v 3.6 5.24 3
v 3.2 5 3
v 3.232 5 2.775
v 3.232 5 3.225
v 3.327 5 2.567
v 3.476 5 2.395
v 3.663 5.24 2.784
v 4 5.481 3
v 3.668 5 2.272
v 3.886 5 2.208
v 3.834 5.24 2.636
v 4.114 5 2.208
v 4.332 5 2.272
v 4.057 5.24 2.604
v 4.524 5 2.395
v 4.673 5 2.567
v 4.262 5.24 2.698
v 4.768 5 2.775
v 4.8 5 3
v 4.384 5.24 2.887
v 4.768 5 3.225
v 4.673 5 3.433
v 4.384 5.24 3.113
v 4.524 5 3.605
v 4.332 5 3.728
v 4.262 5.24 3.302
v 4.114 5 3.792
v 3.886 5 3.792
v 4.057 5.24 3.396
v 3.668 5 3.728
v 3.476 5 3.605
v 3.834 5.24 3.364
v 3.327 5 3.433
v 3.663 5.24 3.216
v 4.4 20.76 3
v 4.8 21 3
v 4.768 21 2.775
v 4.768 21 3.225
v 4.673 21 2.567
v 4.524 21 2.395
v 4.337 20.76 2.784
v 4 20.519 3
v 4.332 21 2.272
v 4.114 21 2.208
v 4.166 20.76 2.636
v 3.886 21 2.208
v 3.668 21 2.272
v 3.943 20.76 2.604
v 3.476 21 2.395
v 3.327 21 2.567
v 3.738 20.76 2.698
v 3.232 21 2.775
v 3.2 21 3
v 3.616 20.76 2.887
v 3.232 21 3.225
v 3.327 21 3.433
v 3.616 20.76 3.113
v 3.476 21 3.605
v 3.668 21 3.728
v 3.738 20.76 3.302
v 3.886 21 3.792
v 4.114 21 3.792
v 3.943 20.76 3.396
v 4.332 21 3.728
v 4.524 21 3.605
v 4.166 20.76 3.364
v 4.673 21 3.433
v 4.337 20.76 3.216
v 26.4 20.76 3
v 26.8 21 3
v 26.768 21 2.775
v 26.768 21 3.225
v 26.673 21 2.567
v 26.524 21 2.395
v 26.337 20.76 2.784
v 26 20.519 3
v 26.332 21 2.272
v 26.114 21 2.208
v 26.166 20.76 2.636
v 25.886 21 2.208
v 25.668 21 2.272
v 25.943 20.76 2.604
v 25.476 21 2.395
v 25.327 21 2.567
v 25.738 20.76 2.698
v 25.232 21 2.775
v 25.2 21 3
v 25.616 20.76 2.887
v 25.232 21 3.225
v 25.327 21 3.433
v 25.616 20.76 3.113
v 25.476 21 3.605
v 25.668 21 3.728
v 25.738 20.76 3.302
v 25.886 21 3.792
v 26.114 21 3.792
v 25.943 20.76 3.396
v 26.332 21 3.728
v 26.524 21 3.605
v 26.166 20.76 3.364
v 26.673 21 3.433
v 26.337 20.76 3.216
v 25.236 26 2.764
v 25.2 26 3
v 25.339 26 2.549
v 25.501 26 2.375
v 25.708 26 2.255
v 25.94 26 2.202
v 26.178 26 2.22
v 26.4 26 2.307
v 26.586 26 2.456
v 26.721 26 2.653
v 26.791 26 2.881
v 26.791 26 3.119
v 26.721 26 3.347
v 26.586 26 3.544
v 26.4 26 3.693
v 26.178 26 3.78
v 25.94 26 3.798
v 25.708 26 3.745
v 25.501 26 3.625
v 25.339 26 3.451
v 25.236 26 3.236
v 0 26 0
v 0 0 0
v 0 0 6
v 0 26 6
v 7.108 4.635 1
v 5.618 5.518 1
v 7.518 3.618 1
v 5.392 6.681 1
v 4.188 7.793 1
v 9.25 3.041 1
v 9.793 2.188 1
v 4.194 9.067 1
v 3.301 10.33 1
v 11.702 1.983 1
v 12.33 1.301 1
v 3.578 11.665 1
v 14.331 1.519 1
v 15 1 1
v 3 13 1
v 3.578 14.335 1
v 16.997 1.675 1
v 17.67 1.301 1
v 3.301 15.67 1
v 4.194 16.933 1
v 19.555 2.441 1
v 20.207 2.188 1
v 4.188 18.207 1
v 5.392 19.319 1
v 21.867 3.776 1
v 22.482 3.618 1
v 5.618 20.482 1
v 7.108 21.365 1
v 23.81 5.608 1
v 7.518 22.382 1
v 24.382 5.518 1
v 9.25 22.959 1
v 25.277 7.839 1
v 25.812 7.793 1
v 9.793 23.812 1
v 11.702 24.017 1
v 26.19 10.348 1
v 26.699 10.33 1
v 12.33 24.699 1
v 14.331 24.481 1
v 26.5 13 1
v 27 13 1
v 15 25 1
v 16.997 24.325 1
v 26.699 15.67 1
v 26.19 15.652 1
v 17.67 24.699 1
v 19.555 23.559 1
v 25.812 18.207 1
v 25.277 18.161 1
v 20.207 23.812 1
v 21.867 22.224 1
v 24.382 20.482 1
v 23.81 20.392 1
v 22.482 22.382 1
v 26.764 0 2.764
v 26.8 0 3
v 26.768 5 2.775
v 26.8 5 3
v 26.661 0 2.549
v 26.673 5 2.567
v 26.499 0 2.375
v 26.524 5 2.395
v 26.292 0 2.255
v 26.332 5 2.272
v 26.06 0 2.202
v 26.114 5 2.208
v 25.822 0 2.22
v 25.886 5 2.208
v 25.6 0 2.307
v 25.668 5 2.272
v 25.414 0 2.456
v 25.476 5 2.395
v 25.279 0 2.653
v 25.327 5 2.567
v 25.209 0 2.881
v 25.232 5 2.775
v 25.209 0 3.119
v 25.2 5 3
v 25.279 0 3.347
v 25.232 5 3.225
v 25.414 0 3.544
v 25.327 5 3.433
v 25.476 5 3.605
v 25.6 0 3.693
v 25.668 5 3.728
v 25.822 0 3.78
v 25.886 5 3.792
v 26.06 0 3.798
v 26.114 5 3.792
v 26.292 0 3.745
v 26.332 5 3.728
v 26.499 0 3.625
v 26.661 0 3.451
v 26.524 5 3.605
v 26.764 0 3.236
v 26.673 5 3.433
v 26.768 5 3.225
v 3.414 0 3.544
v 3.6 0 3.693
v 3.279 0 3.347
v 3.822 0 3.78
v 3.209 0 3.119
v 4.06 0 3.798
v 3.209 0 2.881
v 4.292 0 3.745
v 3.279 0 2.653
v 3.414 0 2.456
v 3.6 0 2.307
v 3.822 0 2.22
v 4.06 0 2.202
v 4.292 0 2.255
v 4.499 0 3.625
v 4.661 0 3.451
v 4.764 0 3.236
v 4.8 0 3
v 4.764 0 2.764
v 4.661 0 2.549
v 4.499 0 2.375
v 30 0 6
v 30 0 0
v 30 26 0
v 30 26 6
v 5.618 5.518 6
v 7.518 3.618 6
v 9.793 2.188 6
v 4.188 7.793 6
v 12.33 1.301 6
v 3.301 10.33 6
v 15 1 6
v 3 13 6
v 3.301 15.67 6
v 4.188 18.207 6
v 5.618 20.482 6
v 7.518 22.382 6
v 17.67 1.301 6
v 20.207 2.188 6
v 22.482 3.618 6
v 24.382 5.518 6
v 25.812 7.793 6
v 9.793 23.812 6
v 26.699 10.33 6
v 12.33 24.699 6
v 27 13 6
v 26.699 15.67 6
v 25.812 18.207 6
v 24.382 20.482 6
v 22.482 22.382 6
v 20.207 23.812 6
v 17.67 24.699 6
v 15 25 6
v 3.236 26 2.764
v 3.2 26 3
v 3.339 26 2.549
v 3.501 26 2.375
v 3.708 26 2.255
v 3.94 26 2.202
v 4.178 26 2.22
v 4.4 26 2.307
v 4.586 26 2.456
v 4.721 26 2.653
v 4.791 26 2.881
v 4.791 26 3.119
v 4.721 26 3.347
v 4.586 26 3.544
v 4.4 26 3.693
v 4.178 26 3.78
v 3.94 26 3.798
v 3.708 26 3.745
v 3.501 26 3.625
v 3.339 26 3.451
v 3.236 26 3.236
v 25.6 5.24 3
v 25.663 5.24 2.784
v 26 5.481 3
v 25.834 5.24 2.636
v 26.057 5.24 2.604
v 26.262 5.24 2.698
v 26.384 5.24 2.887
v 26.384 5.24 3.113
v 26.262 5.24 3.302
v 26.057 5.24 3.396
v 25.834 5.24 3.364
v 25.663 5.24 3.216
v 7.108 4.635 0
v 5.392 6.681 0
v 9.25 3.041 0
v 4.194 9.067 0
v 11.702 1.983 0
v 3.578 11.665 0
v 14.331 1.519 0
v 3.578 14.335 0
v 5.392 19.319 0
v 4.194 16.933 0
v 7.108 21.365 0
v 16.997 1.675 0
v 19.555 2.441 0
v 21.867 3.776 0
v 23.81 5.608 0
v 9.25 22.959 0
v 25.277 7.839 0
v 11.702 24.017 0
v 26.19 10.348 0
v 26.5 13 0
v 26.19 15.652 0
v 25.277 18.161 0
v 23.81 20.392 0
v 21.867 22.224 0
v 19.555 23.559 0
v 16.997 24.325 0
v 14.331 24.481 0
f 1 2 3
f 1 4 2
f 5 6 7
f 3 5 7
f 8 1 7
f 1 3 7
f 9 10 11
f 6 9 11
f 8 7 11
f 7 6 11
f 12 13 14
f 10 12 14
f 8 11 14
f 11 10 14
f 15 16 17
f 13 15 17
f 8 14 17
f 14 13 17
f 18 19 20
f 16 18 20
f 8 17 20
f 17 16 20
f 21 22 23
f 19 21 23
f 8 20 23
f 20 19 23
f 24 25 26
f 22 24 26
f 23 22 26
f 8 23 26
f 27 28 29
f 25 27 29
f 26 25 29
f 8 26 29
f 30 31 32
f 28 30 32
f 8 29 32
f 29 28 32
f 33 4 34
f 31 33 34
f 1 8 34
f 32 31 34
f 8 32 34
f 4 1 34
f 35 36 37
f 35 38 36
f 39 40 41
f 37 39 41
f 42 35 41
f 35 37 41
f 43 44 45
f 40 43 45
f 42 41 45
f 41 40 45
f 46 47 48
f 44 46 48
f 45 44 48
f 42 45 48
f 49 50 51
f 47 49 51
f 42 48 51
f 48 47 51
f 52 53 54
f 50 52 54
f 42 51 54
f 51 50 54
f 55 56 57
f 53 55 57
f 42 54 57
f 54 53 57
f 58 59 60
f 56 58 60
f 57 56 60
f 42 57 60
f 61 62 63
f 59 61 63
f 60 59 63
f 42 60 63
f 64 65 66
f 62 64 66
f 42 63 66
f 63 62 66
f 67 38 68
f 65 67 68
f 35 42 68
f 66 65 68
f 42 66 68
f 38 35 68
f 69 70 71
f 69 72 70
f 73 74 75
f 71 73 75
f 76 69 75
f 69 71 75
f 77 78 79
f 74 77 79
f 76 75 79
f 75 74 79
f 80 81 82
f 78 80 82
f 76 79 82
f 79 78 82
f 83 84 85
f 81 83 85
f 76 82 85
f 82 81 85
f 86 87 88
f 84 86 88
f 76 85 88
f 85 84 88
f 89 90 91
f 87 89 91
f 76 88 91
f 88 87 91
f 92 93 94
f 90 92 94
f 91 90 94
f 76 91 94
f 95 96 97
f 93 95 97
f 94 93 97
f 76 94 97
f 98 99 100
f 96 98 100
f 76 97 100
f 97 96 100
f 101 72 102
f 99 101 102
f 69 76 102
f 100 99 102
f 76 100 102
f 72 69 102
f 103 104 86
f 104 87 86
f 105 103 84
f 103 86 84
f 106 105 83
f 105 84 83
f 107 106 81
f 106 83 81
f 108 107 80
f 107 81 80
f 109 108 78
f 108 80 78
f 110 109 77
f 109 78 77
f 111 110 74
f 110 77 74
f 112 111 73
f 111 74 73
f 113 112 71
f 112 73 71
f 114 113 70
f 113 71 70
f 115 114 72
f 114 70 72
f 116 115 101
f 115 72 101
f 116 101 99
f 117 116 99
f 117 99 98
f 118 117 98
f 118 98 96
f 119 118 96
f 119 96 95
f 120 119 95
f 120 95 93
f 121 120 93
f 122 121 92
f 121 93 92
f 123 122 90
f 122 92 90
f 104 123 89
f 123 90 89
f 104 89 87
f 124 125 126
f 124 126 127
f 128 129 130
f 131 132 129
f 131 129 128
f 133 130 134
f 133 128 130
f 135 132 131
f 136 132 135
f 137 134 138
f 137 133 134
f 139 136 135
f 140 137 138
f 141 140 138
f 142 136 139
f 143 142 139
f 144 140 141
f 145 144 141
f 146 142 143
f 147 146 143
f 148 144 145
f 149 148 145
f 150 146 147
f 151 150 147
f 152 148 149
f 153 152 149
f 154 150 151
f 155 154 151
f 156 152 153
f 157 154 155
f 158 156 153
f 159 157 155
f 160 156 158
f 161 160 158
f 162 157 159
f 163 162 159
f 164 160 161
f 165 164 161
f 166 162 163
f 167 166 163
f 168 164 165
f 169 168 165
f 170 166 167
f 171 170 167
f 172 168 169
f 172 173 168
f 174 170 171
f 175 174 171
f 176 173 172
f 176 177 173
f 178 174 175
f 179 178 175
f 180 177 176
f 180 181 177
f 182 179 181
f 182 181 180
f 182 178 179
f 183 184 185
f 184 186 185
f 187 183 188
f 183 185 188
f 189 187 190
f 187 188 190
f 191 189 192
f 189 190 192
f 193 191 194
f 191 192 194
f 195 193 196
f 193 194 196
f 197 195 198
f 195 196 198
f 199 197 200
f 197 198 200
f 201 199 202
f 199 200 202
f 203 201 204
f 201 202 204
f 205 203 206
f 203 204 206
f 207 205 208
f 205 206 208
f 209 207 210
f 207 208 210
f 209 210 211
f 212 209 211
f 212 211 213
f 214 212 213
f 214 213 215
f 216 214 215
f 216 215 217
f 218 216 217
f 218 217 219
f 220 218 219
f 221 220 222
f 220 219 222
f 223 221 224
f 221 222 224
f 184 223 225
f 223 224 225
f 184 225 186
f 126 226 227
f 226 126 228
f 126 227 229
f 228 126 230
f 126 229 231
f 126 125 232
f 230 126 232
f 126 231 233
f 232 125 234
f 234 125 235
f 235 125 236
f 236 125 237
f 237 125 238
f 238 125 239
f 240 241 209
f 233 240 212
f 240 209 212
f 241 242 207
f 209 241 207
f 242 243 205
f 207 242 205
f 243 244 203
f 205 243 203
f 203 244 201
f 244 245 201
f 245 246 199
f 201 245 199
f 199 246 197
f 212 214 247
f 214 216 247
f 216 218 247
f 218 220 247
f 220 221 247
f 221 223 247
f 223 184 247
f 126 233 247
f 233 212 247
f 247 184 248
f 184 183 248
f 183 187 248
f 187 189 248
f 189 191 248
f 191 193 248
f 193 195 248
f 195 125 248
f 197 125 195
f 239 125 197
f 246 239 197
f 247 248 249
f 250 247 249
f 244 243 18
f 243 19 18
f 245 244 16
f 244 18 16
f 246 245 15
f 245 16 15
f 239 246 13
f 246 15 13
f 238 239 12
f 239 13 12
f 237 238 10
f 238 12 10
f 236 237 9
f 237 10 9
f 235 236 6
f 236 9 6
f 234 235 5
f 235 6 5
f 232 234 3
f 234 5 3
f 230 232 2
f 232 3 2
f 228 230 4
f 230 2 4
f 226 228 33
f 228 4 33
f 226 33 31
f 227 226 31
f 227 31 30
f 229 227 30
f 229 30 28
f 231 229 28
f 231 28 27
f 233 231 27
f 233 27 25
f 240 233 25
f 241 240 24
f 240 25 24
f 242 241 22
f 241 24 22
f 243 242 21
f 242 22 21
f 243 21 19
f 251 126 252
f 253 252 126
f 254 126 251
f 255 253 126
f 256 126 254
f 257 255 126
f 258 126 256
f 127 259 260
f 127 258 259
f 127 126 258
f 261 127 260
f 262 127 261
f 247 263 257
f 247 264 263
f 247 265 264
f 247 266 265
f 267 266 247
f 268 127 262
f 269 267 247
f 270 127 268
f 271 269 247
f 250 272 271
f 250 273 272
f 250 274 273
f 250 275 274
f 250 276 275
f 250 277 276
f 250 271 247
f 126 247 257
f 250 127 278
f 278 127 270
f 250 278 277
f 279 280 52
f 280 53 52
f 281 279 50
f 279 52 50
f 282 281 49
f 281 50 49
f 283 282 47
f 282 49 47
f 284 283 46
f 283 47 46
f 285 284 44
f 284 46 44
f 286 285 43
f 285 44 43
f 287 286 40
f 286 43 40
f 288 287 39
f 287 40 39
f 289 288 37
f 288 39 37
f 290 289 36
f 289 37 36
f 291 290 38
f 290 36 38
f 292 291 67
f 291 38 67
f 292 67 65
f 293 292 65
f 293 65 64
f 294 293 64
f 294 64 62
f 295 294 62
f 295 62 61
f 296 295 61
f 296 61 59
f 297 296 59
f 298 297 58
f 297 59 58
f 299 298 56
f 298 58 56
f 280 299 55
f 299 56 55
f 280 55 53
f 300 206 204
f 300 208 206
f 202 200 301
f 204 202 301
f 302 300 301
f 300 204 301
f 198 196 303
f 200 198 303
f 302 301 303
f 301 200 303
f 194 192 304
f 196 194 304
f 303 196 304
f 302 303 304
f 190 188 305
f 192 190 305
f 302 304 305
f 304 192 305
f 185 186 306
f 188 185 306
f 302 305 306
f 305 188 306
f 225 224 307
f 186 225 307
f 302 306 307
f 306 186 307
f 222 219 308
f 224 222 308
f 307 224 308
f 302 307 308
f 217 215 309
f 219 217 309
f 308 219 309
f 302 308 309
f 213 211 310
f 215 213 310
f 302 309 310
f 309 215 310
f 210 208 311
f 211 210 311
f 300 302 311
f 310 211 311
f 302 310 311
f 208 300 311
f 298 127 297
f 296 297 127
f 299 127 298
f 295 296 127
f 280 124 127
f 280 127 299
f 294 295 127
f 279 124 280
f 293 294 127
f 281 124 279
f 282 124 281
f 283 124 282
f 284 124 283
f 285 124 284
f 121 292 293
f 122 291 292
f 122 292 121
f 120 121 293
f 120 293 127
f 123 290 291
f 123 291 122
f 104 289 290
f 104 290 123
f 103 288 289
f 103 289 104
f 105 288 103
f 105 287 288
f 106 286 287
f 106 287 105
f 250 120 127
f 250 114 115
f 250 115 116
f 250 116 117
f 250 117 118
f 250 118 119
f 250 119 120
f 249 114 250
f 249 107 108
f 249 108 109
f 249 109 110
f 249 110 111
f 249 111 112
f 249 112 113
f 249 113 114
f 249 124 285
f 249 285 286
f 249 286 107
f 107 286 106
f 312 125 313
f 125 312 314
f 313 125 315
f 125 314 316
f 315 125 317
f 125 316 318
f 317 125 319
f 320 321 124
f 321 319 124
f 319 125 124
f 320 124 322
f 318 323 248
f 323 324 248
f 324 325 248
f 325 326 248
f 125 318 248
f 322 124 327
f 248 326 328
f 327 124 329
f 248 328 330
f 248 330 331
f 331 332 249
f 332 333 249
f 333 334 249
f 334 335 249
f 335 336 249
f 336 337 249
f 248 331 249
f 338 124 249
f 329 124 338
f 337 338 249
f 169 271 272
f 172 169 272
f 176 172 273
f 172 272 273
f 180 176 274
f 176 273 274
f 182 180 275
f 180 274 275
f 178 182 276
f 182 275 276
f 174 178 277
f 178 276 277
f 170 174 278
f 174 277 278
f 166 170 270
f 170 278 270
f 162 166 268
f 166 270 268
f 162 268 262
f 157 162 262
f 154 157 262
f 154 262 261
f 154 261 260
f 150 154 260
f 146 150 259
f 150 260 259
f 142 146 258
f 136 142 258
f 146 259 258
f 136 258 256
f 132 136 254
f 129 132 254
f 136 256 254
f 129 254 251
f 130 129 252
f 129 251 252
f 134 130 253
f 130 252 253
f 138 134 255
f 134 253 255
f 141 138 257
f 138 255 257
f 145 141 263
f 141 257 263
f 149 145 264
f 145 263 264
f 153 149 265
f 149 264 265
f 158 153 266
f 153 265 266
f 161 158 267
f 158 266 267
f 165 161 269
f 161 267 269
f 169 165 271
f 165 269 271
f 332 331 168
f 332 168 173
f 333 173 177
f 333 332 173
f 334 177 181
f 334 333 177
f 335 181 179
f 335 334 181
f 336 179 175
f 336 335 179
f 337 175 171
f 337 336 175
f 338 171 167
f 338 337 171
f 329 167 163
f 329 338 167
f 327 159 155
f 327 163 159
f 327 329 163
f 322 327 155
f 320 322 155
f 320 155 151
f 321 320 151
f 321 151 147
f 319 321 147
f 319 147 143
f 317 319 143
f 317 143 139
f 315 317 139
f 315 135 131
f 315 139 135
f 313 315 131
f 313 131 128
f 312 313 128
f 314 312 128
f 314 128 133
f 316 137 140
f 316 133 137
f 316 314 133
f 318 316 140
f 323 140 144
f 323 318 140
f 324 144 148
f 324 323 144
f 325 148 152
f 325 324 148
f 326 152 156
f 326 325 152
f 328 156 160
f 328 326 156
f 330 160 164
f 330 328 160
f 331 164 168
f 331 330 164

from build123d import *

# Parameters (mm, degrees)
ESQUISSE1_W                                   = 30
ESQUISSE1_H                                   = 26
ESQUISSE1_R                                   = 11.5
BOSS_EXTRU_1_DEPTH                            = 6
ESQUISSE2_R                                   = 12
ENL_V_MAT_EXTRU_1_DEPTH                       = 5
TROU_POUR_TARAUDAGE_POUR_TROU_TARAUD_M2_D     = 1.6
TROU_POUR_TARAUDAGE_POUR_TROU_TARAUD_M2_DEPTH = 5
TROU_POUR_TARAUDAGE_POUR_TROU_TARAUD_M2_TIP   = 0.480688495
TROU_POUR_TARAUDAGE_POUR_TROU_TARAUD_2_D      = 1.6
TROU_POUR_TARAUDAGE_POUR_TROU_TARAUD_2_DEPTH  = 5
TROU_POUR_TARAUDAGE_POUR_TROU_TARAUD_2_TIP    = 0.480688495


with BuildPart() as part:
    # Esquisse1 → Boss.-Extru.1 (new body)
    with BuildSketch(Plane.XY):
        with Locations((15, 13)):
            Rectangle(ESQUISSE1_W, ESQUISSE1_H)
        with Locations((15, 13)):
            Circle(ESQUISSE1_R, mode=Mode.SUBTRACT)
    extrude(amount=BOSS_EXTRU_1_DEPTH)

    # Esquisse2 → Enlèv. mat.-Extru.1 (cut)
    with BuildSketch(Plane.XY.offset(6)):
        with Locations((15, 13)):
            Circle(ESQUISSE2_R)
    extrude(amount=-ENL_V_MAT_EXTRU_1_DEPTH, mode=Mode.SUBTRACT)

    # Trou pour taraudage pour trou taraud_ M2
    with Locations(Plane(origin=(0, 26, 0), x_dir=(1, 0, 0), z_dir=(0, 1, 0))):
        with Locations((4, -3), (26, -3)):
            Hole(TROU_POUR_TARAUDAGE_POUR_TROU_TARAUD_M2_D / 2, depth=TROU_POUR_TARAUDAGE_POUR_TROU_TARAUD_M2_DEPTH)
            with Locations((0, 0, -(TROU_POUR_TARAUDAGE_POUR_TROU_TARAUD_M2_DEPTH + TROU_POUR_TARAUDAGE_POUR_TROU_TARAUD_M2_TIP / 2))):  # 118° drill point
                Cone(0, TROU_POUR_TARAUDAGE_POUR_TROU_TARAUD_M2_D / 2, TROU_POUR_TARAUDAGE_POUR_TROU_TARAUD_M2_TIP, mode=Mode.SUBTRACT)

    # Trou pour taraudage pour trou taraud 2
    with Locations(Plane(origin=(0, 0, 0), x_dir=(-1, 0, 0), z_dir=(0, -1, 0))):
        with Locations((-4, -3), (-26, -3)):
            Hole(TROU_POUR_TARAUDAGE_POUR_TROU_TARAUD_2_D / 2, depth=TROU_POUR_TARAUDAGE_POUR_TROU_TARAUD_2_DEPTH)
            with Locations((0, 0, -(TROU_POUR_TARAUDAGE_POUR_TROU_TARAUD_2_DEPTH + TROU_POUR_TARAUDAGE_POUR_TROU_TARAUD_2_TIP / 2))):  # 118° drill point
                Cone(0, TROU_POUR_TARAUDAGE_POUR_TROU_TARAUD_2_D / 2, TROU_POUR_TARAUDAGE_POUR_TROU_TARAUD_2_TIP, mode=Mode.SUBTRACT)


solid = part.part
